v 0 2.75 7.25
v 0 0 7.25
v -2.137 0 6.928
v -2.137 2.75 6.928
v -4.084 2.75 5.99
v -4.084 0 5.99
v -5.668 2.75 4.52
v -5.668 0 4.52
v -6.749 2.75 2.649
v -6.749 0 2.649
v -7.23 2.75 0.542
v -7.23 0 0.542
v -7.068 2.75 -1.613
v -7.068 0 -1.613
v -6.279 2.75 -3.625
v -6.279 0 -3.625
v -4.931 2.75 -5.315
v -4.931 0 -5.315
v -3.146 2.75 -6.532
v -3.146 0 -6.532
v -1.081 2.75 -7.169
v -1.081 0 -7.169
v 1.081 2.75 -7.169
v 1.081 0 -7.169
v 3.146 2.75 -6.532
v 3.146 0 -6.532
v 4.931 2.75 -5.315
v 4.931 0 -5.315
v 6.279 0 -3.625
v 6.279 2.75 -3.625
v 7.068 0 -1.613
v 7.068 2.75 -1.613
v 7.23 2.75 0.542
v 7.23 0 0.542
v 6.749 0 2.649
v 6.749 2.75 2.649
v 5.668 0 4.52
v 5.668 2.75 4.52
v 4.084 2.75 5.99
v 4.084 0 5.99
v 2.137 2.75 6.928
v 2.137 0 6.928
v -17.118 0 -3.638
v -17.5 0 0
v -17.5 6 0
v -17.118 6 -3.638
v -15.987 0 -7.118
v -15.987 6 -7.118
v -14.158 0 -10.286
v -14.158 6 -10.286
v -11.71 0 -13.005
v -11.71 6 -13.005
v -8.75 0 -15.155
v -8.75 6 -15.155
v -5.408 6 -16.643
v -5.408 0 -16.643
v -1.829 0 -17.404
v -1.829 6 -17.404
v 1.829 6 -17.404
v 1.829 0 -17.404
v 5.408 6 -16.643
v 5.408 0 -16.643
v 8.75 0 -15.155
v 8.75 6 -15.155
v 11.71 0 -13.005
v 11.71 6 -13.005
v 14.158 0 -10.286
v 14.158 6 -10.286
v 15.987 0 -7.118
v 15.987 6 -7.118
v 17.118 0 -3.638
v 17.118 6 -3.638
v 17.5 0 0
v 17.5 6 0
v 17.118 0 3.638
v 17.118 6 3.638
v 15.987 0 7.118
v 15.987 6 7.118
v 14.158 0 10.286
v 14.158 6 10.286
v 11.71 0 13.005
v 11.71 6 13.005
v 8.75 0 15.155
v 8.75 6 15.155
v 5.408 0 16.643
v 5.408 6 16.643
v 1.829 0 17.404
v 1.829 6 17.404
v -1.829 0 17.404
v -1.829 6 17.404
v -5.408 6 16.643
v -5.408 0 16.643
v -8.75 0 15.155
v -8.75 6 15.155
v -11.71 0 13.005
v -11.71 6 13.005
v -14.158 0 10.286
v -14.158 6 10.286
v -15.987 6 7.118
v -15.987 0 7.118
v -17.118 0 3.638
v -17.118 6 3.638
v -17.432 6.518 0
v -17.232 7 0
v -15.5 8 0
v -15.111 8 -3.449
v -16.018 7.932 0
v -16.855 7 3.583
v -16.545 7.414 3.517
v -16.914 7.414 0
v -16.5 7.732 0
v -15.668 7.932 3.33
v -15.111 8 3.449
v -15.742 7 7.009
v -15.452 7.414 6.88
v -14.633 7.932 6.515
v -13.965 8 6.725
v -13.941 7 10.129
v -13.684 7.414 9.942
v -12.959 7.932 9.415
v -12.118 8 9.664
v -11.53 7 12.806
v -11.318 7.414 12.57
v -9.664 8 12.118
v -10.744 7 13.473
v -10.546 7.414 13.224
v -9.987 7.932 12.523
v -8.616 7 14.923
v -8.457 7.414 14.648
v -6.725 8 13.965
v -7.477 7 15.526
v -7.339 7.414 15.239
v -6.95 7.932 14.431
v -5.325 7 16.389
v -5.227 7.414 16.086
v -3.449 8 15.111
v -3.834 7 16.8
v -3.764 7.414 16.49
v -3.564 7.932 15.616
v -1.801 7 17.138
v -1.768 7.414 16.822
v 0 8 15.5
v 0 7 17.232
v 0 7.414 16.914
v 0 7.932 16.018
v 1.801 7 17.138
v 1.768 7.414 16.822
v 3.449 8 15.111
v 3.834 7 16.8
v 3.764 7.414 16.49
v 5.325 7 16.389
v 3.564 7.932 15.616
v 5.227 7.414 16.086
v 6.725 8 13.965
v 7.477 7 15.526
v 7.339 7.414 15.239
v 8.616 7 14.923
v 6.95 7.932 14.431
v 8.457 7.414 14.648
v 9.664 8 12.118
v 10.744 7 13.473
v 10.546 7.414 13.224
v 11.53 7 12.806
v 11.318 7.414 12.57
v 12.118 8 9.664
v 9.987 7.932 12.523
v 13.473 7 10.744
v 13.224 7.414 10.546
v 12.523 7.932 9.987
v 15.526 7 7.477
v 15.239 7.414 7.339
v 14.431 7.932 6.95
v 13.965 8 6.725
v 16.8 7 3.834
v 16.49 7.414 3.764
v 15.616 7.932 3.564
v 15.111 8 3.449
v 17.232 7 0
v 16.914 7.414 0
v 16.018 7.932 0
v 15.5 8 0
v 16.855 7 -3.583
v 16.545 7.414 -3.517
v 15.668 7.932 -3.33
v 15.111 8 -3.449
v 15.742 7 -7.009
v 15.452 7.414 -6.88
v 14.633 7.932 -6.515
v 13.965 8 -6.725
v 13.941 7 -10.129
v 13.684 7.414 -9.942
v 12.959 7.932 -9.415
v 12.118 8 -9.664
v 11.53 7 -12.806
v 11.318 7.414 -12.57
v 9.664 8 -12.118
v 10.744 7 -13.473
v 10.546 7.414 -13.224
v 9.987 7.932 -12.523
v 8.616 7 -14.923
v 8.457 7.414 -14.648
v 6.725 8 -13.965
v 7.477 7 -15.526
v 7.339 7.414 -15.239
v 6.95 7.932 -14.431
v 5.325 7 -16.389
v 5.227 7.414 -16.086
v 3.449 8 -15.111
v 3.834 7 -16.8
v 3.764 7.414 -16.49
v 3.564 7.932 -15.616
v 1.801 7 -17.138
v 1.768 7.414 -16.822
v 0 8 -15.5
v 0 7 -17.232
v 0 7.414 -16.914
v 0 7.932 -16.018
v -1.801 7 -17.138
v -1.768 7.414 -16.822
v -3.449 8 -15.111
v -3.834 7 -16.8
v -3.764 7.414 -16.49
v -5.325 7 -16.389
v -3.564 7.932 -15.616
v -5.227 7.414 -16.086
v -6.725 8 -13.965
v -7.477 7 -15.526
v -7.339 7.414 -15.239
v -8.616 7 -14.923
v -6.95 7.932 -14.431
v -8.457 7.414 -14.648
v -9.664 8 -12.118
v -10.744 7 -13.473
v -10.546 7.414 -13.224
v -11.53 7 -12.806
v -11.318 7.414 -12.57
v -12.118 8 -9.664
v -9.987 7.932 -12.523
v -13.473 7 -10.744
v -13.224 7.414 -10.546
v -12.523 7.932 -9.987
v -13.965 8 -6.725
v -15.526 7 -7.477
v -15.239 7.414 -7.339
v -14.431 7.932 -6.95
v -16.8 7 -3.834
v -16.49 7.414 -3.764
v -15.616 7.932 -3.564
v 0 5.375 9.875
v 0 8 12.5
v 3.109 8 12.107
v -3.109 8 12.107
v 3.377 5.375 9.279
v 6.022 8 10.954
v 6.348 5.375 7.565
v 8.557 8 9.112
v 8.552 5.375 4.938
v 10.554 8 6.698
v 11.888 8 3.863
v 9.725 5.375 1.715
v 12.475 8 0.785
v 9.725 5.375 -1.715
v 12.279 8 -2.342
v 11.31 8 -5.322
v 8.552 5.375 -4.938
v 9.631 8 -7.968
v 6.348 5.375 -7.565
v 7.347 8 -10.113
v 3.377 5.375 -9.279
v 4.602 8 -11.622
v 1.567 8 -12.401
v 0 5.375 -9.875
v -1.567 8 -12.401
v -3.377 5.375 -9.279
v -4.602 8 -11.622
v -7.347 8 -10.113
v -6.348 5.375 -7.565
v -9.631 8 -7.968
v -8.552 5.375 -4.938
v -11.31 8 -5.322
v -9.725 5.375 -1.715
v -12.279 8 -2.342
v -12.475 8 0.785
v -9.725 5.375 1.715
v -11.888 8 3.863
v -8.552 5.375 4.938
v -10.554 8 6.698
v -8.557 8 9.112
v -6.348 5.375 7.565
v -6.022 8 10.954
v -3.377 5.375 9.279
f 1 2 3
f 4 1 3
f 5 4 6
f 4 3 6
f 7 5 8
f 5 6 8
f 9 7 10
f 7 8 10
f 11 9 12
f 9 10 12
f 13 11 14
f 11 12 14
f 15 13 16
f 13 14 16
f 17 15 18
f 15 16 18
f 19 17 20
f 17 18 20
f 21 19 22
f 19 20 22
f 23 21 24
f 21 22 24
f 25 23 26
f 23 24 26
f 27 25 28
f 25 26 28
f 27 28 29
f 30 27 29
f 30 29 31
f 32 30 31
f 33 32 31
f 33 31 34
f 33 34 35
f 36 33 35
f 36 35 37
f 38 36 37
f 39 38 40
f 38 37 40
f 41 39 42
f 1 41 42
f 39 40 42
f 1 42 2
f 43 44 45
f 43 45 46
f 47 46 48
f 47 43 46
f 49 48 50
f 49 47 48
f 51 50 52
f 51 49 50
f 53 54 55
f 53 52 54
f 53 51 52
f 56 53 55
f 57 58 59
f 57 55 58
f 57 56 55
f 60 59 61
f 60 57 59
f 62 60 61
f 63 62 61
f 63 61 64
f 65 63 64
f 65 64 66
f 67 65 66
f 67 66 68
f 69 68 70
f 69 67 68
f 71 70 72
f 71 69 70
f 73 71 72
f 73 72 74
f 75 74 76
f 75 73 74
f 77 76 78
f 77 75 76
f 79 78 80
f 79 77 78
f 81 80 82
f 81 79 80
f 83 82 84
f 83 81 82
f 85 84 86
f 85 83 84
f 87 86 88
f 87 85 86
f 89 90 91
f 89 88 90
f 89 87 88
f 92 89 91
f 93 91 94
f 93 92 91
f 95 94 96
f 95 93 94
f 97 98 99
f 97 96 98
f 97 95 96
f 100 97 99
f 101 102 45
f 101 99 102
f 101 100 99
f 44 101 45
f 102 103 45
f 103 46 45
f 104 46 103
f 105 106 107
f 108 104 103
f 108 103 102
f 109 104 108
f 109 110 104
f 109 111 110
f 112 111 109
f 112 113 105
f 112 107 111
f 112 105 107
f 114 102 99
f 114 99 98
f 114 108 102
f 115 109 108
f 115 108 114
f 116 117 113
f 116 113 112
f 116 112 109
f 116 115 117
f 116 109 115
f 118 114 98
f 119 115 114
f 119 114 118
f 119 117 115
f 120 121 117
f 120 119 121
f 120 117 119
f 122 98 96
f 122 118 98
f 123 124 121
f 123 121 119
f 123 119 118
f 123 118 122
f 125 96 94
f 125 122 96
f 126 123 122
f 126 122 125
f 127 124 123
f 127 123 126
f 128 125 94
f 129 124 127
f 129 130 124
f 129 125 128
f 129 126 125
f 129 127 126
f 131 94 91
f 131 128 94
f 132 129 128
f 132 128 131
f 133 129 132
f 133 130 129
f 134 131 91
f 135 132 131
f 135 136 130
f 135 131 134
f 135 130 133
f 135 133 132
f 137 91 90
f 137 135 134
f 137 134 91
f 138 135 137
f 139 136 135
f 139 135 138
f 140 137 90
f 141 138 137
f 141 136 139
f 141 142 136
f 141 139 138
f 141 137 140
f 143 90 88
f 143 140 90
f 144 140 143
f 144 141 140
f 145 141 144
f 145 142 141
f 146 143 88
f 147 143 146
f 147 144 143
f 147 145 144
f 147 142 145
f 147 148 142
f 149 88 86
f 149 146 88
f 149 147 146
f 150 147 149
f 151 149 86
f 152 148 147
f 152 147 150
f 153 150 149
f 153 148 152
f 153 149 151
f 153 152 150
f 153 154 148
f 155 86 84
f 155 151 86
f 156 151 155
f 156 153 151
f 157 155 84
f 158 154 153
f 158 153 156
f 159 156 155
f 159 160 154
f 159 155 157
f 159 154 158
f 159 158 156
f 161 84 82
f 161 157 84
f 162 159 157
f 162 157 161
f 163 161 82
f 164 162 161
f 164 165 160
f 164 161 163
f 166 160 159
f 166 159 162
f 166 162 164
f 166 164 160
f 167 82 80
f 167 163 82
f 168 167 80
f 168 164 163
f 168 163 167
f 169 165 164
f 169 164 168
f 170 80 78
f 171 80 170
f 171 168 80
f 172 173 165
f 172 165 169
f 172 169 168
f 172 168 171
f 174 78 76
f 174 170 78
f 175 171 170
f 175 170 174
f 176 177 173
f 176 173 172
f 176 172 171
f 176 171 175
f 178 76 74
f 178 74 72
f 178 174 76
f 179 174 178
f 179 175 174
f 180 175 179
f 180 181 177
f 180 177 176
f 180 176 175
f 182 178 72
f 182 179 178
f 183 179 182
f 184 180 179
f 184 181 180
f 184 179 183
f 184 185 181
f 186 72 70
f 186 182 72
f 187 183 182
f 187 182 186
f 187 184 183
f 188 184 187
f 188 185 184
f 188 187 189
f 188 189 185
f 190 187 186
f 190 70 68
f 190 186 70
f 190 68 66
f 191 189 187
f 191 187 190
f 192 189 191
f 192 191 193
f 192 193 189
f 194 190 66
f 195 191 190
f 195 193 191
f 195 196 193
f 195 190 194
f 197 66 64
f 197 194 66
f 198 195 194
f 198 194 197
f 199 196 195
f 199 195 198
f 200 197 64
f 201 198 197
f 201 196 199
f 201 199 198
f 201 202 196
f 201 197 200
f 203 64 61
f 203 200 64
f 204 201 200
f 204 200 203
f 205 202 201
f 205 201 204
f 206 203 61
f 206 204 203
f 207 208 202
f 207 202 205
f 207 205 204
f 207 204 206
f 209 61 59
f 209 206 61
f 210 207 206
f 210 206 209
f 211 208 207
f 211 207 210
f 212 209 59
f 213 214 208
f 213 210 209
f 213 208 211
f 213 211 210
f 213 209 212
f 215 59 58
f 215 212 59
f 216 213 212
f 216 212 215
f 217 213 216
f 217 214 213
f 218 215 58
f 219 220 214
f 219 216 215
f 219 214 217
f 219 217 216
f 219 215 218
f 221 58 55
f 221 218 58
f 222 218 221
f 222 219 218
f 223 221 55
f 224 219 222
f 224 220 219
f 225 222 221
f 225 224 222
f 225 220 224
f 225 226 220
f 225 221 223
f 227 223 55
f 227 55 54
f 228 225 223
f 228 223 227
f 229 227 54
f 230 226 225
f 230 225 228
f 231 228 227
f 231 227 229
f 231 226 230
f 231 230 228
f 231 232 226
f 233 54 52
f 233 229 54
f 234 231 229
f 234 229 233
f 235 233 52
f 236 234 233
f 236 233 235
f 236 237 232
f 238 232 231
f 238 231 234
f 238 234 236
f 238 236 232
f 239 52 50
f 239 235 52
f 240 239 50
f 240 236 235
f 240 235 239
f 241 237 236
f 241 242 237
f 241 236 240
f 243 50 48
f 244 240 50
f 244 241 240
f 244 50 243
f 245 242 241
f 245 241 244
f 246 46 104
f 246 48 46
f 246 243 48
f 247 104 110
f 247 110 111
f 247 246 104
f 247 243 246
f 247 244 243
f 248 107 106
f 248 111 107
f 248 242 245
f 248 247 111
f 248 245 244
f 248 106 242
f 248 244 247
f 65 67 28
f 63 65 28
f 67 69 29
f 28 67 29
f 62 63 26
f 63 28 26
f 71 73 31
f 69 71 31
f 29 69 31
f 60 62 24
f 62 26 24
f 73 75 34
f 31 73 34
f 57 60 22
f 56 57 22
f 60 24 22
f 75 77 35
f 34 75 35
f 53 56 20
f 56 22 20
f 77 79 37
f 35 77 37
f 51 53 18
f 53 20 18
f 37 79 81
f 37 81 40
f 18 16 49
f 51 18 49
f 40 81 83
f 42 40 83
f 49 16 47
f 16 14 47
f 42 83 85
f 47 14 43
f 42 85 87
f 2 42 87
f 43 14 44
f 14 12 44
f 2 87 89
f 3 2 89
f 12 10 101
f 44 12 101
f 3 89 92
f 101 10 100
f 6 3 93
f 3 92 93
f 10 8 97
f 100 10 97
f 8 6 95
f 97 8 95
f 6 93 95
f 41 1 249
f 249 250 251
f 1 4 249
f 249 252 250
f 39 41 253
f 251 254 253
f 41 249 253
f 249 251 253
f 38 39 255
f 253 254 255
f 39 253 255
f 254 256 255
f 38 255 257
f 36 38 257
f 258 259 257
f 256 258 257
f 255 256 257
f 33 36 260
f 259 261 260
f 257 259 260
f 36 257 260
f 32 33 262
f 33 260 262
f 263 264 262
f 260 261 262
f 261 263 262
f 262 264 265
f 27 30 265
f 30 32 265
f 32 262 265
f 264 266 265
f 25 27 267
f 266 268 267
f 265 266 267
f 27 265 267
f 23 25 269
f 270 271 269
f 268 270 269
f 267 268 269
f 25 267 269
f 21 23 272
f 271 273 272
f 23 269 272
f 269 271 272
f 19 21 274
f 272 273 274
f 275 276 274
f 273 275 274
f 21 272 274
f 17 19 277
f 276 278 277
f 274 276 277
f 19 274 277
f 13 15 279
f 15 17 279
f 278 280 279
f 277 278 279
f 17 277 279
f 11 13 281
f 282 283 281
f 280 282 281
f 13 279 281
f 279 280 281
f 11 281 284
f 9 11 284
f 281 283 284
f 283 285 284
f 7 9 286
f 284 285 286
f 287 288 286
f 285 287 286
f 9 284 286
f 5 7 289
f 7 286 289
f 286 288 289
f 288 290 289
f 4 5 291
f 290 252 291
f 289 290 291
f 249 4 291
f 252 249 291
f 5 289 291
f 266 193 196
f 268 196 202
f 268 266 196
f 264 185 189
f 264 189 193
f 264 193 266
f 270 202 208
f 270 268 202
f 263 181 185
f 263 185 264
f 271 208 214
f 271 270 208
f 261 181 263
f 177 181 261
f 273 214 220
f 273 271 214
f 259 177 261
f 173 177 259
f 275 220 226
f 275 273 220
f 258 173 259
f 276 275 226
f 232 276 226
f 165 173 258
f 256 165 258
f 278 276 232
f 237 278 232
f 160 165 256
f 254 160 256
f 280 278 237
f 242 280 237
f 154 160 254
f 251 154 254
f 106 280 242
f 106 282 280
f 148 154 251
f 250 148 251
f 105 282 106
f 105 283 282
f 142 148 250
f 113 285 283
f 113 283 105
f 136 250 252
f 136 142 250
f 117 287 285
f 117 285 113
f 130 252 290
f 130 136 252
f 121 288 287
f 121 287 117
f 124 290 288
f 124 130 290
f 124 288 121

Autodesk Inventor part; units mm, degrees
ref_plane "YZ Plane" through (0, 0, 0) normal (1, 0, 0) x (0, 1, 0)
ref_plane "XZ Plane" through (0, 0, 0) normal (0, 1, 0) x (-1, 0, 0)
ref_plane "XY Plane" through (0, 0, 0) normal (0, 0, 1) x (1, 0, 0)
sketch "Sketch1" plane through (0, 0, 0) normal (0, 1, 0) x (-1, 0, 0)
  circle A0 centre (0, 0) radius 17.5
  dimension "d0" = 35
extrude "Extrusion1" add sketch "Sketch1" along normal blind 8
fillet "Fillet1" radius 2 1 edges at (17.5, 8, 0)
sketch "Sketch2" plane through (0, 8, 0) normal (0, 1, 0) x (1, 0, 0)
  point P0 (0, 0)
  point P1 (0, 0)
hole "Hole1" at (0, 8, 0) direction (0, -1, 0) diameter 14.5 end through all countersink diameter 25 countersink angle 90
sketch "Sketch3" plane through (0, 8, 0) normal (0, 1, 0) x (1, 0, 0)
  point P0 (0, 0)
properties part number "washer.special" material "Steel, High Strength, Low Alloy"
